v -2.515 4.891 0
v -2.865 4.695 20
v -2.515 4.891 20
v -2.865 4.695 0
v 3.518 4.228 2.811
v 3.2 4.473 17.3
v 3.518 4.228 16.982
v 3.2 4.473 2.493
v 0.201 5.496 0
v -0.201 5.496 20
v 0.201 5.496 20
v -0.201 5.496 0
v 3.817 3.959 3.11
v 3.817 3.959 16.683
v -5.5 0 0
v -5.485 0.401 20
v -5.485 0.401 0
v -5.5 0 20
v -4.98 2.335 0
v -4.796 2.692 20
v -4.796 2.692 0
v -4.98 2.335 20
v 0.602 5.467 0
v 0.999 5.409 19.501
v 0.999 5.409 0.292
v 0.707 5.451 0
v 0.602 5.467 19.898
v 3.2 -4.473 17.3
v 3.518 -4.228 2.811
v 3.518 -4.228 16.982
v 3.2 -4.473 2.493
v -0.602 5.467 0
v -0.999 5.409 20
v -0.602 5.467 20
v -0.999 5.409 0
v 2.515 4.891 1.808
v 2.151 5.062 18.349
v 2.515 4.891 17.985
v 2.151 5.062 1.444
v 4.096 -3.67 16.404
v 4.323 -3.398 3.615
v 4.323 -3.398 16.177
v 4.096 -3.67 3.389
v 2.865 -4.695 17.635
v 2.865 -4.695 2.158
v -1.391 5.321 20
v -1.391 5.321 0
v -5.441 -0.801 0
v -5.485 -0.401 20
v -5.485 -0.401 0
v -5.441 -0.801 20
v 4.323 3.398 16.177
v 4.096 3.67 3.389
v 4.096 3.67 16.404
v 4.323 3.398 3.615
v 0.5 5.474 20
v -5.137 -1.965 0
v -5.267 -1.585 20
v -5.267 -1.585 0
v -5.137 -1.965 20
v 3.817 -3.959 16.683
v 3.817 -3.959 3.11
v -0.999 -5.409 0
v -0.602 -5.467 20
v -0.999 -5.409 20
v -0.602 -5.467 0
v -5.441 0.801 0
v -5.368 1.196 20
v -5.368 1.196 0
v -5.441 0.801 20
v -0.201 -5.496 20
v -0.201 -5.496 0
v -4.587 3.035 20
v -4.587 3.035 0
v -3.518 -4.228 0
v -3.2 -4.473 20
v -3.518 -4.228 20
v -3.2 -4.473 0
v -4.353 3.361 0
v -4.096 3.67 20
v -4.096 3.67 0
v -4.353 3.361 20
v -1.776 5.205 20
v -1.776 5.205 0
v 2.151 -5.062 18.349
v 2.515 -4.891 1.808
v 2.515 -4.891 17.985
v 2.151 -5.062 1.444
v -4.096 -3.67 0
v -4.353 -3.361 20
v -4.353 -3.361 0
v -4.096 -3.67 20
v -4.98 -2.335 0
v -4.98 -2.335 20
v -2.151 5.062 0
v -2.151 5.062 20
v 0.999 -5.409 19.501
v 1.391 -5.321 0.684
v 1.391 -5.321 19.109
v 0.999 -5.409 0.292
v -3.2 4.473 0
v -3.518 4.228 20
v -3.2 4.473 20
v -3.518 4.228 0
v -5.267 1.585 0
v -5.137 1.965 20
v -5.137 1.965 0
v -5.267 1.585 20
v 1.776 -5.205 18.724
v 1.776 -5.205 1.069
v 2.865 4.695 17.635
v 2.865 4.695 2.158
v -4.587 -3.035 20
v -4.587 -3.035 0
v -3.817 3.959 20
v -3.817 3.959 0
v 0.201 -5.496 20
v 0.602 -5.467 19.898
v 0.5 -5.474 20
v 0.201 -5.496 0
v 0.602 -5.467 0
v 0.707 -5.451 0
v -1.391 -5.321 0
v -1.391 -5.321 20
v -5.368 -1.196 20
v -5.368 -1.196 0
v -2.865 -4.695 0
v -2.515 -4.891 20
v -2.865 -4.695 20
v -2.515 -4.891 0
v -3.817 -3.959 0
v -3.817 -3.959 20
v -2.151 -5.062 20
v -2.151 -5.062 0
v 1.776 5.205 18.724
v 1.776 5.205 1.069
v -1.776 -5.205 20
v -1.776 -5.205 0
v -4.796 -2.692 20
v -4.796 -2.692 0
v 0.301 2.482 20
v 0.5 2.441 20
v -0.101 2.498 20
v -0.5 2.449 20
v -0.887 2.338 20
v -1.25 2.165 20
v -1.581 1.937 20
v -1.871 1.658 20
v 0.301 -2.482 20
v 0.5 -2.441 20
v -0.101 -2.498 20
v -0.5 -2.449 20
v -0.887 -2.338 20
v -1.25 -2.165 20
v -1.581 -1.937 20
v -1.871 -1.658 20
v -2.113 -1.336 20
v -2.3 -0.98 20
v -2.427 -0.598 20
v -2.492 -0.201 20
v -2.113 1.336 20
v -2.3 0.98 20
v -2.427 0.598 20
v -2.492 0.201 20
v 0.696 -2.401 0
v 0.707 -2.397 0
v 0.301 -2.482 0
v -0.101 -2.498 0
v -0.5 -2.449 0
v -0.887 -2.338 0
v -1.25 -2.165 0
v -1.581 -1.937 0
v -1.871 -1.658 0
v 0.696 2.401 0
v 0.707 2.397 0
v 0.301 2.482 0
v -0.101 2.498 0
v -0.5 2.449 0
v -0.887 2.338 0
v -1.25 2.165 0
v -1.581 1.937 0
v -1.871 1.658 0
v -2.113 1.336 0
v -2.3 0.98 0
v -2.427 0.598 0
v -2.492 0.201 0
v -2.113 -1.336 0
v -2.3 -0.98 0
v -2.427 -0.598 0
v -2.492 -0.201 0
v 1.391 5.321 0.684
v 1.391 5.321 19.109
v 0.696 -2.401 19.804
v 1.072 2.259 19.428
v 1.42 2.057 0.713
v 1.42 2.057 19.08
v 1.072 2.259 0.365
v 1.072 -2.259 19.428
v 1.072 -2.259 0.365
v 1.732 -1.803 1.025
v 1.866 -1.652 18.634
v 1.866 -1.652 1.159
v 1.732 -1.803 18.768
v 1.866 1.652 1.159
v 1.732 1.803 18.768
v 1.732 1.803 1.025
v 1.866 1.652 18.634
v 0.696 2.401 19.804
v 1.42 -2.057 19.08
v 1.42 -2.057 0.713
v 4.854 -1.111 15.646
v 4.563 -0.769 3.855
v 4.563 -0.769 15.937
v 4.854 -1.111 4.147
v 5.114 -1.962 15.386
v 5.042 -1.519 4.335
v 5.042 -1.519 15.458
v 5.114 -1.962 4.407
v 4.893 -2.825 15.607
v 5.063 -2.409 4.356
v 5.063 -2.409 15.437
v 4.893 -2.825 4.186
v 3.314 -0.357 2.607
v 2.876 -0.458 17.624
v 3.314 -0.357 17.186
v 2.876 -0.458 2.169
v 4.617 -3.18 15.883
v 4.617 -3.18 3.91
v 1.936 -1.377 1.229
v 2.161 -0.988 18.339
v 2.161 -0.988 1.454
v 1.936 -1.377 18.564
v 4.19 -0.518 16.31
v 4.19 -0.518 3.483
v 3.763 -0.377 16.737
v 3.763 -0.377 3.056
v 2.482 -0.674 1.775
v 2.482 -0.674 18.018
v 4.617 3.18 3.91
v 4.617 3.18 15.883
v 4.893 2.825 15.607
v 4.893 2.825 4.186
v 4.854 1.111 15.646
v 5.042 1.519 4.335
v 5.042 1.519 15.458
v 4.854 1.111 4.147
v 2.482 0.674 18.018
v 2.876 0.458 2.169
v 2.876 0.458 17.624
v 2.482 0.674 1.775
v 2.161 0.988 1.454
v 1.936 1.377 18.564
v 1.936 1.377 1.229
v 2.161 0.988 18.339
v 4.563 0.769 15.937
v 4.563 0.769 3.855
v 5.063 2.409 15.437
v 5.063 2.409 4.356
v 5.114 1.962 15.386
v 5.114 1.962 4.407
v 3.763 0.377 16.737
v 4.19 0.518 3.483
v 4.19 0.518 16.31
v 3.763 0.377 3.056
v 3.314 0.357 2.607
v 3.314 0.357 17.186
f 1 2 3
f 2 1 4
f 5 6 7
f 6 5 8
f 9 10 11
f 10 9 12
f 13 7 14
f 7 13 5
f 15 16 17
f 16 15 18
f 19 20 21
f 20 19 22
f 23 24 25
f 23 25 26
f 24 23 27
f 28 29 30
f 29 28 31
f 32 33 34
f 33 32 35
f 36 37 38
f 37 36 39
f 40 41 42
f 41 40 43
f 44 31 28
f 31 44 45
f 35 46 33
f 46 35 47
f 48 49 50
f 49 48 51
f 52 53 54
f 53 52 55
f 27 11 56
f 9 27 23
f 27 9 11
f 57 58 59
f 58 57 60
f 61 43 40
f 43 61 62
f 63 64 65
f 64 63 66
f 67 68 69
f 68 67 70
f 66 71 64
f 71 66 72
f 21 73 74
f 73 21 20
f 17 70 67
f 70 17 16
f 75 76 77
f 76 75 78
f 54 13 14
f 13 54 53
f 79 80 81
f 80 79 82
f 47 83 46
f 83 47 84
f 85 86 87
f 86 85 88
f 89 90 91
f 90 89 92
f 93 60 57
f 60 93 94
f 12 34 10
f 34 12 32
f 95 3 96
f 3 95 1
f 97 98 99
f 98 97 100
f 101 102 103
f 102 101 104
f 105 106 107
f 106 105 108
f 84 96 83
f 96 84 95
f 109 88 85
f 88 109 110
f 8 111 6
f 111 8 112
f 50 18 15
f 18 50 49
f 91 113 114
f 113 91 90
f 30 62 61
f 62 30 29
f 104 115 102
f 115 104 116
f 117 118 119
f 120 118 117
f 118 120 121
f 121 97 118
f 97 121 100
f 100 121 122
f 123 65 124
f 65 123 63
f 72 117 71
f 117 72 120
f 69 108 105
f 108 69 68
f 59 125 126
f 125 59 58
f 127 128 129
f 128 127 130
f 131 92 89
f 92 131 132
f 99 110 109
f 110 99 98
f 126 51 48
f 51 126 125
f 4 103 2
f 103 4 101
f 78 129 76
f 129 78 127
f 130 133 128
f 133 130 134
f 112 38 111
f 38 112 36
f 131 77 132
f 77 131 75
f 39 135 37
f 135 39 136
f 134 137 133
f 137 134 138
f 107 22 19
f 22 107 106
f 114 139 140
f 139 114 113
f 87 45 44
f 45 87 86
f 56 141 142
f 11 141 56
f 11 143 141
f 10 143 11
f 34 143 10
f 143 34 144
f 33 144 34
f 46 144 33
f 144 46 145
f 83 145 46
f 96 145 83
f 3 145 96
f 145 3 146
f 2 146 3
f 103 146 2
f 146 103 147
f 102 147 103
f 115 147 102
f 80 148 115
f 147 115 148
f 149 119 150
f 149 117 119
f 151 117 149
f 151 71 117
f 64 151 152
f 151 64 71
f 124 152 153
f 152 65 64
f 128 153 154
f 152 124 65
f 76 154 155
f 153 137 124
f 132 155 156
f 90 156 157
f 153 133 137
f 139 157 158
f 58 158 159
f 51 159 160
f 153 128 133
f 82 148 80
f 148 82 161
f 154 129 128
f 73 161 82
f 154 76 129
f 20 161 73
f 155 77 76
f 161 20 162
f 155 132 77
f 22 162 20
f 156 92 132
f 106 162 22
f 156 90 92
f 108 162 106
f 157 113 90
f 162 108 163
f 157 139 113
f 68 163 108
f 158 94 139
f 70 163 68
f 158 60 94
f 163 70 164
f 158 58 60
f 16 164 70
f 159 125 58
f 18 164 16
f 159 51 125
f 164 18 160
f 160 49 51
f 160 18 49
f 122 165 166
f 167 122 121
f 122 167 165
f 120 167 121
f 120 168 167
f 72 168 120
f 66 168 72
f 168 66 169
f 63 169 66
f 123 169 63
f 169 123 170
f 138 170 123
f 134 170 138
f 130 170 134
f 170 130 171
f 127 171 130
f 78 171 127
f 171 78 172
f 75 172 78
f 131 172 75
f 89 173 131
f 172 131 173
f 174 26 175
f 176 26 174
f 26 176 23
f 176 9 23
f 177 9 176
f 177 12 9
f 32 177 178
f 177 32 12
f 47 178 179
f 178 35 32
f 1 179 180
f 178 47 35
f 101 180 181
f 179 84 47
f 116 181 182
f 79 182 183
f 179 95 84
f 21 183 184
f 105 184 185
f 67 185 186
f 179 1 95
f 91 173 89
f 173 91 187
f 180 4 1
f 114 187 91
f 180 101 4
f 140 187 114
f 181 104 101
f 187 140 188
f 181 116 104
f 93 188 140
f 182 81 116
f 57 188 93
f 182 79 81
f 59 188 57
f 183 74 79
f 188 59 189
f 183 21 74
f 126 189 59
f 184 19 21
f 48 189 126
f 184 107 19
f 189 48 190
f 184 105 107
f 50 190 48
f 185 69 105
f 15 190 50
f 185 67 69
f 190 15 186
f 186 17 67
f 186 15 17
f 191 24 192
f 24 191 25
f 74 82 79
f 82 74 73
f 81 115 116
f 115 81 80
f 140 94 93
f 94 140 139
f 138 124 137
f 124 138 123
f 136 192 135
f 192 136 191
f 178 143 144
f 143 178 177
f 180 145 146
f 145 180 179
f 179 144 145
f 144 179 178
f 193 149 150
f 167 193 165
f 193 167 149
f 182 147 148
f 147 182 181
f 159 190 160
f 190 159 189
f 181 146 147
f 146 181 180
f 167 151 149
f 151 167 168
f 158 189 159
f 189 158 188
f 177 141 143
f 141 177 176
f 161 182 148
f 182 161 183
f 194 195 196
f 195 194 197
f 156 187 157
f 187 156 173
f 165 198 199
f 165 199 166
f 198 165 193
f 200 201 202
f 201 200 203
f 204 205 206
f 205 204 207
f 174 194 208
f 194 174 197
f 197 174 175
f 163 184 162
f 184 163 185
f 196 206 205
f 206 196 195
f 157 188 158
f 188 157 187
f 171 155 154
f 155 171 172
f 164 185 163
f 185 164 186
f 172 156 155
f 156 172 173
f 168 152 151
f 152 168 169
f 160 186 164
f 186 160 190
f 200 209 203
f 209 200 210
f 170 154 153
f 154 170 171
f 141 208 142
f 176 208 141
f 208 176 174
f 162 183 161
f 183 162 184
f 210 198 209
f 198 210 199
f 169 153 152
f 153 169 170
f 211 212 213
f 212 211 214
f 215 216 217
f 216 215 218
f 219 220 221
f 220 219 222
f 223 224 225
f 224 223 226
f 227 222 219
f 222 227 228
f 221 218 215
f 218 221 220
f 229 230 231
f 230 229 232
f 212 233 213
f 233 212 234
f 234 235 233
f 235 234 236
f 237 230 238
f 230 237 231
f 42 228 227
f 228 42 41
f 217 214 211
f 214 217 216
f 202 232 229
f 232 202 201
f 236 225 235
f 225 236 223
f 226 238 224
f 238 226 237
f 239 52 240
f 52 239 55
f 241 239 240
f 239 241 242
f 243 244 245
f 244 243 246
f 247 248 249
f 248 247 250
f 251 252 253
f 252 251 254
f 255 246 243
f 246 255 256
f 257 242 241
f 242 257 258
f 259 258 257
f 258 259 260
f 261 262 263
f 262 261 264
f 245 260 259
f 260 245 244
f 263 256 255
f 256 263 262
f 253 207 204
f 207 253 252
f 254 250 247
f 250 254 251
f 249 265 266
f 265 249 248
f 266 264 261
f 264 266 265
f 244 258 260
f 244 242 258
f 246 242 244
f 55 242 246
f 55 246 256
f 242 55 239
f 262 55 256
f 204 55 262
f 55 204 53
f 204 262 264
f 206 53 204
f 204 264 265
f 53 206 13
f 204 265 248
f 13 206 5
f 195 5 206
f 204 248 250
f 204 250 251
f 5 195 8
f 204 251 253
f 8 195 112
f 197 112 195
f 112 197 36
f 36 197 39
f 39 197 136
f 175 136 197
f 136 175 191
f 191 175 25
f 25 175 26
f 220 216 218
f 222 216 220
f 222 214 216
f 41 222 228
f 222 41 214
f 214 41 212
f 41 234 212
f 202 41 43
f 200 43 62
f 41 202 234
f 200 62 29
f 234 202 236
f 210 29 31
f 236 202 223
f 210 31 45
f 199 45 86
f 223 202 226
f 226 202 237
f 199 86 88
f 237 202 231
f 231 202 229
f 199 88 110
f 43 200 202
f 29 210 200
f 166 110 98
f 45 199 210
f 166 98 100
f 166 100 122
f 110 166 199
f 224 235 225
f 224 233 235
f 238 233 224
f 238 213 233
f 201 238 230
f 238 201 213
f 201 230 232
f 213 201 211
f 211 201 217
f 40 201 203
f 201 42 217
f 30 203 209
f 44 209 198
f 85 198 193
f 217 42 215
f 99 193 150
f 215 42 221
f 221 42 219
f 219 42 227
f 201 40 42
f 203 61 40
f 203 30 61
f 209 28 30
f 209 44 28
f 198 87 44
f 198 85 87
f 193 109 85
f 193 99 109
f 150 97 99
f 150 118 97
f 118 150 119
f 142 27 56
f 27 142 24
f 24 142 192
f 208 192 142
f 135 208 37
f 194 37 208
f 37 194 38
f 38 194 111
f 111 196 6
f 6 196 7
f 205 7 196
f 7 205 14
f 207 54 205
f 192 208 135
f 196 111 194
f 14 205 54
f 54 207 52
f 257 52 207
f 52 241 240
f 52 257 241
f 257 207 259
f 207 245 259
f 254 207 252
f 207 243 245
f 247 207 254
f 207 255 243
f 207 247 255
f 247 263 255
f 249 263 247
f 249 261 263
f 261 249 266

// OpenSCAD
clipInnerDiam = 5;
clipThikness = 3;
clipHeight = 20;
clipPercentOverlap = 10;
clipAngle = 60;
bevelAngle = 45;

module clip(id=clipInnerDiam,t=clipThikness,h=clipHeight){

	difference(){
		cylinder(r=id/2+t,h=h,$fn=PI*(id/2+t)*5);
		translate([0,0,-.5])
		cylinder(r=id/2,h=h+1,$fn=PI*id/2*5);
	}
}

module pie(radius, angle, height, spin=0) {
    // Negative angles shift direction of rotation
    clockwise = (angle < 0) ? true : false;
    // Support angles < 0 and > 360
    normalized_angle = abs((angle % 360 != 0) ? angle % 360 : angle % 360 + 360);
    // Select rotation direction
    rotation = clockwise ? [0, 180 - normalized_angle] : [180, normalized_angle];
    // Render
    if (angle != 0) {
        rotate([0,0,spin]) linear_extrude(height=height)
            difference() {
                circle(radius);
                if (normalized_angle < 180) {
                    union() for(a = rotation)
                        rotate(a) translate([-radius, 0, 0]) square(radius * 2);
                }
                else if (normalized_angle != 360) {
                    intersection_for(a = rotation)
                        rotate(a) translate([-radius, 0, 0]) square(radius * 2);
                }
            }
    }
}

difference() {
    union() {
        difference() {
            clip();
            translate([0,0,-.5])
            pie(clipInnerDiam+clipThikness, clipAngle, clipHeight+1, -clipAngle/2);
        }

        for (r=[-clipAngle/2,clipAngle/2]) rotate([0,0,r])
            translate([clipInnerDiam/2+clipThikness/2,0,0])
            cylinder(r=clipThikness/2*(1+clipPercentOverlap/100),h=clipHeight,$fn=PI*clipThikness/2*5);
    }

    rotate([0,-bevelAngle,0])
    translate([0,-clipInnerDiam-clipThikness,-clipHeight-0.5])
    cube([(clipInnerDiam+clipThikness)*2, (clipInnerDiam+clipThikness)*2, clipHeight]);
    
    translate([0,-clipInnerDiam-clipThikness,clipHeight+0.5])
    rotate([0,bevelAngle,0])
    cube([(clipInnerDiam+clipThikness)*2, (clipInnerDiam+clipThikness)*2, clipHeight]);
}
